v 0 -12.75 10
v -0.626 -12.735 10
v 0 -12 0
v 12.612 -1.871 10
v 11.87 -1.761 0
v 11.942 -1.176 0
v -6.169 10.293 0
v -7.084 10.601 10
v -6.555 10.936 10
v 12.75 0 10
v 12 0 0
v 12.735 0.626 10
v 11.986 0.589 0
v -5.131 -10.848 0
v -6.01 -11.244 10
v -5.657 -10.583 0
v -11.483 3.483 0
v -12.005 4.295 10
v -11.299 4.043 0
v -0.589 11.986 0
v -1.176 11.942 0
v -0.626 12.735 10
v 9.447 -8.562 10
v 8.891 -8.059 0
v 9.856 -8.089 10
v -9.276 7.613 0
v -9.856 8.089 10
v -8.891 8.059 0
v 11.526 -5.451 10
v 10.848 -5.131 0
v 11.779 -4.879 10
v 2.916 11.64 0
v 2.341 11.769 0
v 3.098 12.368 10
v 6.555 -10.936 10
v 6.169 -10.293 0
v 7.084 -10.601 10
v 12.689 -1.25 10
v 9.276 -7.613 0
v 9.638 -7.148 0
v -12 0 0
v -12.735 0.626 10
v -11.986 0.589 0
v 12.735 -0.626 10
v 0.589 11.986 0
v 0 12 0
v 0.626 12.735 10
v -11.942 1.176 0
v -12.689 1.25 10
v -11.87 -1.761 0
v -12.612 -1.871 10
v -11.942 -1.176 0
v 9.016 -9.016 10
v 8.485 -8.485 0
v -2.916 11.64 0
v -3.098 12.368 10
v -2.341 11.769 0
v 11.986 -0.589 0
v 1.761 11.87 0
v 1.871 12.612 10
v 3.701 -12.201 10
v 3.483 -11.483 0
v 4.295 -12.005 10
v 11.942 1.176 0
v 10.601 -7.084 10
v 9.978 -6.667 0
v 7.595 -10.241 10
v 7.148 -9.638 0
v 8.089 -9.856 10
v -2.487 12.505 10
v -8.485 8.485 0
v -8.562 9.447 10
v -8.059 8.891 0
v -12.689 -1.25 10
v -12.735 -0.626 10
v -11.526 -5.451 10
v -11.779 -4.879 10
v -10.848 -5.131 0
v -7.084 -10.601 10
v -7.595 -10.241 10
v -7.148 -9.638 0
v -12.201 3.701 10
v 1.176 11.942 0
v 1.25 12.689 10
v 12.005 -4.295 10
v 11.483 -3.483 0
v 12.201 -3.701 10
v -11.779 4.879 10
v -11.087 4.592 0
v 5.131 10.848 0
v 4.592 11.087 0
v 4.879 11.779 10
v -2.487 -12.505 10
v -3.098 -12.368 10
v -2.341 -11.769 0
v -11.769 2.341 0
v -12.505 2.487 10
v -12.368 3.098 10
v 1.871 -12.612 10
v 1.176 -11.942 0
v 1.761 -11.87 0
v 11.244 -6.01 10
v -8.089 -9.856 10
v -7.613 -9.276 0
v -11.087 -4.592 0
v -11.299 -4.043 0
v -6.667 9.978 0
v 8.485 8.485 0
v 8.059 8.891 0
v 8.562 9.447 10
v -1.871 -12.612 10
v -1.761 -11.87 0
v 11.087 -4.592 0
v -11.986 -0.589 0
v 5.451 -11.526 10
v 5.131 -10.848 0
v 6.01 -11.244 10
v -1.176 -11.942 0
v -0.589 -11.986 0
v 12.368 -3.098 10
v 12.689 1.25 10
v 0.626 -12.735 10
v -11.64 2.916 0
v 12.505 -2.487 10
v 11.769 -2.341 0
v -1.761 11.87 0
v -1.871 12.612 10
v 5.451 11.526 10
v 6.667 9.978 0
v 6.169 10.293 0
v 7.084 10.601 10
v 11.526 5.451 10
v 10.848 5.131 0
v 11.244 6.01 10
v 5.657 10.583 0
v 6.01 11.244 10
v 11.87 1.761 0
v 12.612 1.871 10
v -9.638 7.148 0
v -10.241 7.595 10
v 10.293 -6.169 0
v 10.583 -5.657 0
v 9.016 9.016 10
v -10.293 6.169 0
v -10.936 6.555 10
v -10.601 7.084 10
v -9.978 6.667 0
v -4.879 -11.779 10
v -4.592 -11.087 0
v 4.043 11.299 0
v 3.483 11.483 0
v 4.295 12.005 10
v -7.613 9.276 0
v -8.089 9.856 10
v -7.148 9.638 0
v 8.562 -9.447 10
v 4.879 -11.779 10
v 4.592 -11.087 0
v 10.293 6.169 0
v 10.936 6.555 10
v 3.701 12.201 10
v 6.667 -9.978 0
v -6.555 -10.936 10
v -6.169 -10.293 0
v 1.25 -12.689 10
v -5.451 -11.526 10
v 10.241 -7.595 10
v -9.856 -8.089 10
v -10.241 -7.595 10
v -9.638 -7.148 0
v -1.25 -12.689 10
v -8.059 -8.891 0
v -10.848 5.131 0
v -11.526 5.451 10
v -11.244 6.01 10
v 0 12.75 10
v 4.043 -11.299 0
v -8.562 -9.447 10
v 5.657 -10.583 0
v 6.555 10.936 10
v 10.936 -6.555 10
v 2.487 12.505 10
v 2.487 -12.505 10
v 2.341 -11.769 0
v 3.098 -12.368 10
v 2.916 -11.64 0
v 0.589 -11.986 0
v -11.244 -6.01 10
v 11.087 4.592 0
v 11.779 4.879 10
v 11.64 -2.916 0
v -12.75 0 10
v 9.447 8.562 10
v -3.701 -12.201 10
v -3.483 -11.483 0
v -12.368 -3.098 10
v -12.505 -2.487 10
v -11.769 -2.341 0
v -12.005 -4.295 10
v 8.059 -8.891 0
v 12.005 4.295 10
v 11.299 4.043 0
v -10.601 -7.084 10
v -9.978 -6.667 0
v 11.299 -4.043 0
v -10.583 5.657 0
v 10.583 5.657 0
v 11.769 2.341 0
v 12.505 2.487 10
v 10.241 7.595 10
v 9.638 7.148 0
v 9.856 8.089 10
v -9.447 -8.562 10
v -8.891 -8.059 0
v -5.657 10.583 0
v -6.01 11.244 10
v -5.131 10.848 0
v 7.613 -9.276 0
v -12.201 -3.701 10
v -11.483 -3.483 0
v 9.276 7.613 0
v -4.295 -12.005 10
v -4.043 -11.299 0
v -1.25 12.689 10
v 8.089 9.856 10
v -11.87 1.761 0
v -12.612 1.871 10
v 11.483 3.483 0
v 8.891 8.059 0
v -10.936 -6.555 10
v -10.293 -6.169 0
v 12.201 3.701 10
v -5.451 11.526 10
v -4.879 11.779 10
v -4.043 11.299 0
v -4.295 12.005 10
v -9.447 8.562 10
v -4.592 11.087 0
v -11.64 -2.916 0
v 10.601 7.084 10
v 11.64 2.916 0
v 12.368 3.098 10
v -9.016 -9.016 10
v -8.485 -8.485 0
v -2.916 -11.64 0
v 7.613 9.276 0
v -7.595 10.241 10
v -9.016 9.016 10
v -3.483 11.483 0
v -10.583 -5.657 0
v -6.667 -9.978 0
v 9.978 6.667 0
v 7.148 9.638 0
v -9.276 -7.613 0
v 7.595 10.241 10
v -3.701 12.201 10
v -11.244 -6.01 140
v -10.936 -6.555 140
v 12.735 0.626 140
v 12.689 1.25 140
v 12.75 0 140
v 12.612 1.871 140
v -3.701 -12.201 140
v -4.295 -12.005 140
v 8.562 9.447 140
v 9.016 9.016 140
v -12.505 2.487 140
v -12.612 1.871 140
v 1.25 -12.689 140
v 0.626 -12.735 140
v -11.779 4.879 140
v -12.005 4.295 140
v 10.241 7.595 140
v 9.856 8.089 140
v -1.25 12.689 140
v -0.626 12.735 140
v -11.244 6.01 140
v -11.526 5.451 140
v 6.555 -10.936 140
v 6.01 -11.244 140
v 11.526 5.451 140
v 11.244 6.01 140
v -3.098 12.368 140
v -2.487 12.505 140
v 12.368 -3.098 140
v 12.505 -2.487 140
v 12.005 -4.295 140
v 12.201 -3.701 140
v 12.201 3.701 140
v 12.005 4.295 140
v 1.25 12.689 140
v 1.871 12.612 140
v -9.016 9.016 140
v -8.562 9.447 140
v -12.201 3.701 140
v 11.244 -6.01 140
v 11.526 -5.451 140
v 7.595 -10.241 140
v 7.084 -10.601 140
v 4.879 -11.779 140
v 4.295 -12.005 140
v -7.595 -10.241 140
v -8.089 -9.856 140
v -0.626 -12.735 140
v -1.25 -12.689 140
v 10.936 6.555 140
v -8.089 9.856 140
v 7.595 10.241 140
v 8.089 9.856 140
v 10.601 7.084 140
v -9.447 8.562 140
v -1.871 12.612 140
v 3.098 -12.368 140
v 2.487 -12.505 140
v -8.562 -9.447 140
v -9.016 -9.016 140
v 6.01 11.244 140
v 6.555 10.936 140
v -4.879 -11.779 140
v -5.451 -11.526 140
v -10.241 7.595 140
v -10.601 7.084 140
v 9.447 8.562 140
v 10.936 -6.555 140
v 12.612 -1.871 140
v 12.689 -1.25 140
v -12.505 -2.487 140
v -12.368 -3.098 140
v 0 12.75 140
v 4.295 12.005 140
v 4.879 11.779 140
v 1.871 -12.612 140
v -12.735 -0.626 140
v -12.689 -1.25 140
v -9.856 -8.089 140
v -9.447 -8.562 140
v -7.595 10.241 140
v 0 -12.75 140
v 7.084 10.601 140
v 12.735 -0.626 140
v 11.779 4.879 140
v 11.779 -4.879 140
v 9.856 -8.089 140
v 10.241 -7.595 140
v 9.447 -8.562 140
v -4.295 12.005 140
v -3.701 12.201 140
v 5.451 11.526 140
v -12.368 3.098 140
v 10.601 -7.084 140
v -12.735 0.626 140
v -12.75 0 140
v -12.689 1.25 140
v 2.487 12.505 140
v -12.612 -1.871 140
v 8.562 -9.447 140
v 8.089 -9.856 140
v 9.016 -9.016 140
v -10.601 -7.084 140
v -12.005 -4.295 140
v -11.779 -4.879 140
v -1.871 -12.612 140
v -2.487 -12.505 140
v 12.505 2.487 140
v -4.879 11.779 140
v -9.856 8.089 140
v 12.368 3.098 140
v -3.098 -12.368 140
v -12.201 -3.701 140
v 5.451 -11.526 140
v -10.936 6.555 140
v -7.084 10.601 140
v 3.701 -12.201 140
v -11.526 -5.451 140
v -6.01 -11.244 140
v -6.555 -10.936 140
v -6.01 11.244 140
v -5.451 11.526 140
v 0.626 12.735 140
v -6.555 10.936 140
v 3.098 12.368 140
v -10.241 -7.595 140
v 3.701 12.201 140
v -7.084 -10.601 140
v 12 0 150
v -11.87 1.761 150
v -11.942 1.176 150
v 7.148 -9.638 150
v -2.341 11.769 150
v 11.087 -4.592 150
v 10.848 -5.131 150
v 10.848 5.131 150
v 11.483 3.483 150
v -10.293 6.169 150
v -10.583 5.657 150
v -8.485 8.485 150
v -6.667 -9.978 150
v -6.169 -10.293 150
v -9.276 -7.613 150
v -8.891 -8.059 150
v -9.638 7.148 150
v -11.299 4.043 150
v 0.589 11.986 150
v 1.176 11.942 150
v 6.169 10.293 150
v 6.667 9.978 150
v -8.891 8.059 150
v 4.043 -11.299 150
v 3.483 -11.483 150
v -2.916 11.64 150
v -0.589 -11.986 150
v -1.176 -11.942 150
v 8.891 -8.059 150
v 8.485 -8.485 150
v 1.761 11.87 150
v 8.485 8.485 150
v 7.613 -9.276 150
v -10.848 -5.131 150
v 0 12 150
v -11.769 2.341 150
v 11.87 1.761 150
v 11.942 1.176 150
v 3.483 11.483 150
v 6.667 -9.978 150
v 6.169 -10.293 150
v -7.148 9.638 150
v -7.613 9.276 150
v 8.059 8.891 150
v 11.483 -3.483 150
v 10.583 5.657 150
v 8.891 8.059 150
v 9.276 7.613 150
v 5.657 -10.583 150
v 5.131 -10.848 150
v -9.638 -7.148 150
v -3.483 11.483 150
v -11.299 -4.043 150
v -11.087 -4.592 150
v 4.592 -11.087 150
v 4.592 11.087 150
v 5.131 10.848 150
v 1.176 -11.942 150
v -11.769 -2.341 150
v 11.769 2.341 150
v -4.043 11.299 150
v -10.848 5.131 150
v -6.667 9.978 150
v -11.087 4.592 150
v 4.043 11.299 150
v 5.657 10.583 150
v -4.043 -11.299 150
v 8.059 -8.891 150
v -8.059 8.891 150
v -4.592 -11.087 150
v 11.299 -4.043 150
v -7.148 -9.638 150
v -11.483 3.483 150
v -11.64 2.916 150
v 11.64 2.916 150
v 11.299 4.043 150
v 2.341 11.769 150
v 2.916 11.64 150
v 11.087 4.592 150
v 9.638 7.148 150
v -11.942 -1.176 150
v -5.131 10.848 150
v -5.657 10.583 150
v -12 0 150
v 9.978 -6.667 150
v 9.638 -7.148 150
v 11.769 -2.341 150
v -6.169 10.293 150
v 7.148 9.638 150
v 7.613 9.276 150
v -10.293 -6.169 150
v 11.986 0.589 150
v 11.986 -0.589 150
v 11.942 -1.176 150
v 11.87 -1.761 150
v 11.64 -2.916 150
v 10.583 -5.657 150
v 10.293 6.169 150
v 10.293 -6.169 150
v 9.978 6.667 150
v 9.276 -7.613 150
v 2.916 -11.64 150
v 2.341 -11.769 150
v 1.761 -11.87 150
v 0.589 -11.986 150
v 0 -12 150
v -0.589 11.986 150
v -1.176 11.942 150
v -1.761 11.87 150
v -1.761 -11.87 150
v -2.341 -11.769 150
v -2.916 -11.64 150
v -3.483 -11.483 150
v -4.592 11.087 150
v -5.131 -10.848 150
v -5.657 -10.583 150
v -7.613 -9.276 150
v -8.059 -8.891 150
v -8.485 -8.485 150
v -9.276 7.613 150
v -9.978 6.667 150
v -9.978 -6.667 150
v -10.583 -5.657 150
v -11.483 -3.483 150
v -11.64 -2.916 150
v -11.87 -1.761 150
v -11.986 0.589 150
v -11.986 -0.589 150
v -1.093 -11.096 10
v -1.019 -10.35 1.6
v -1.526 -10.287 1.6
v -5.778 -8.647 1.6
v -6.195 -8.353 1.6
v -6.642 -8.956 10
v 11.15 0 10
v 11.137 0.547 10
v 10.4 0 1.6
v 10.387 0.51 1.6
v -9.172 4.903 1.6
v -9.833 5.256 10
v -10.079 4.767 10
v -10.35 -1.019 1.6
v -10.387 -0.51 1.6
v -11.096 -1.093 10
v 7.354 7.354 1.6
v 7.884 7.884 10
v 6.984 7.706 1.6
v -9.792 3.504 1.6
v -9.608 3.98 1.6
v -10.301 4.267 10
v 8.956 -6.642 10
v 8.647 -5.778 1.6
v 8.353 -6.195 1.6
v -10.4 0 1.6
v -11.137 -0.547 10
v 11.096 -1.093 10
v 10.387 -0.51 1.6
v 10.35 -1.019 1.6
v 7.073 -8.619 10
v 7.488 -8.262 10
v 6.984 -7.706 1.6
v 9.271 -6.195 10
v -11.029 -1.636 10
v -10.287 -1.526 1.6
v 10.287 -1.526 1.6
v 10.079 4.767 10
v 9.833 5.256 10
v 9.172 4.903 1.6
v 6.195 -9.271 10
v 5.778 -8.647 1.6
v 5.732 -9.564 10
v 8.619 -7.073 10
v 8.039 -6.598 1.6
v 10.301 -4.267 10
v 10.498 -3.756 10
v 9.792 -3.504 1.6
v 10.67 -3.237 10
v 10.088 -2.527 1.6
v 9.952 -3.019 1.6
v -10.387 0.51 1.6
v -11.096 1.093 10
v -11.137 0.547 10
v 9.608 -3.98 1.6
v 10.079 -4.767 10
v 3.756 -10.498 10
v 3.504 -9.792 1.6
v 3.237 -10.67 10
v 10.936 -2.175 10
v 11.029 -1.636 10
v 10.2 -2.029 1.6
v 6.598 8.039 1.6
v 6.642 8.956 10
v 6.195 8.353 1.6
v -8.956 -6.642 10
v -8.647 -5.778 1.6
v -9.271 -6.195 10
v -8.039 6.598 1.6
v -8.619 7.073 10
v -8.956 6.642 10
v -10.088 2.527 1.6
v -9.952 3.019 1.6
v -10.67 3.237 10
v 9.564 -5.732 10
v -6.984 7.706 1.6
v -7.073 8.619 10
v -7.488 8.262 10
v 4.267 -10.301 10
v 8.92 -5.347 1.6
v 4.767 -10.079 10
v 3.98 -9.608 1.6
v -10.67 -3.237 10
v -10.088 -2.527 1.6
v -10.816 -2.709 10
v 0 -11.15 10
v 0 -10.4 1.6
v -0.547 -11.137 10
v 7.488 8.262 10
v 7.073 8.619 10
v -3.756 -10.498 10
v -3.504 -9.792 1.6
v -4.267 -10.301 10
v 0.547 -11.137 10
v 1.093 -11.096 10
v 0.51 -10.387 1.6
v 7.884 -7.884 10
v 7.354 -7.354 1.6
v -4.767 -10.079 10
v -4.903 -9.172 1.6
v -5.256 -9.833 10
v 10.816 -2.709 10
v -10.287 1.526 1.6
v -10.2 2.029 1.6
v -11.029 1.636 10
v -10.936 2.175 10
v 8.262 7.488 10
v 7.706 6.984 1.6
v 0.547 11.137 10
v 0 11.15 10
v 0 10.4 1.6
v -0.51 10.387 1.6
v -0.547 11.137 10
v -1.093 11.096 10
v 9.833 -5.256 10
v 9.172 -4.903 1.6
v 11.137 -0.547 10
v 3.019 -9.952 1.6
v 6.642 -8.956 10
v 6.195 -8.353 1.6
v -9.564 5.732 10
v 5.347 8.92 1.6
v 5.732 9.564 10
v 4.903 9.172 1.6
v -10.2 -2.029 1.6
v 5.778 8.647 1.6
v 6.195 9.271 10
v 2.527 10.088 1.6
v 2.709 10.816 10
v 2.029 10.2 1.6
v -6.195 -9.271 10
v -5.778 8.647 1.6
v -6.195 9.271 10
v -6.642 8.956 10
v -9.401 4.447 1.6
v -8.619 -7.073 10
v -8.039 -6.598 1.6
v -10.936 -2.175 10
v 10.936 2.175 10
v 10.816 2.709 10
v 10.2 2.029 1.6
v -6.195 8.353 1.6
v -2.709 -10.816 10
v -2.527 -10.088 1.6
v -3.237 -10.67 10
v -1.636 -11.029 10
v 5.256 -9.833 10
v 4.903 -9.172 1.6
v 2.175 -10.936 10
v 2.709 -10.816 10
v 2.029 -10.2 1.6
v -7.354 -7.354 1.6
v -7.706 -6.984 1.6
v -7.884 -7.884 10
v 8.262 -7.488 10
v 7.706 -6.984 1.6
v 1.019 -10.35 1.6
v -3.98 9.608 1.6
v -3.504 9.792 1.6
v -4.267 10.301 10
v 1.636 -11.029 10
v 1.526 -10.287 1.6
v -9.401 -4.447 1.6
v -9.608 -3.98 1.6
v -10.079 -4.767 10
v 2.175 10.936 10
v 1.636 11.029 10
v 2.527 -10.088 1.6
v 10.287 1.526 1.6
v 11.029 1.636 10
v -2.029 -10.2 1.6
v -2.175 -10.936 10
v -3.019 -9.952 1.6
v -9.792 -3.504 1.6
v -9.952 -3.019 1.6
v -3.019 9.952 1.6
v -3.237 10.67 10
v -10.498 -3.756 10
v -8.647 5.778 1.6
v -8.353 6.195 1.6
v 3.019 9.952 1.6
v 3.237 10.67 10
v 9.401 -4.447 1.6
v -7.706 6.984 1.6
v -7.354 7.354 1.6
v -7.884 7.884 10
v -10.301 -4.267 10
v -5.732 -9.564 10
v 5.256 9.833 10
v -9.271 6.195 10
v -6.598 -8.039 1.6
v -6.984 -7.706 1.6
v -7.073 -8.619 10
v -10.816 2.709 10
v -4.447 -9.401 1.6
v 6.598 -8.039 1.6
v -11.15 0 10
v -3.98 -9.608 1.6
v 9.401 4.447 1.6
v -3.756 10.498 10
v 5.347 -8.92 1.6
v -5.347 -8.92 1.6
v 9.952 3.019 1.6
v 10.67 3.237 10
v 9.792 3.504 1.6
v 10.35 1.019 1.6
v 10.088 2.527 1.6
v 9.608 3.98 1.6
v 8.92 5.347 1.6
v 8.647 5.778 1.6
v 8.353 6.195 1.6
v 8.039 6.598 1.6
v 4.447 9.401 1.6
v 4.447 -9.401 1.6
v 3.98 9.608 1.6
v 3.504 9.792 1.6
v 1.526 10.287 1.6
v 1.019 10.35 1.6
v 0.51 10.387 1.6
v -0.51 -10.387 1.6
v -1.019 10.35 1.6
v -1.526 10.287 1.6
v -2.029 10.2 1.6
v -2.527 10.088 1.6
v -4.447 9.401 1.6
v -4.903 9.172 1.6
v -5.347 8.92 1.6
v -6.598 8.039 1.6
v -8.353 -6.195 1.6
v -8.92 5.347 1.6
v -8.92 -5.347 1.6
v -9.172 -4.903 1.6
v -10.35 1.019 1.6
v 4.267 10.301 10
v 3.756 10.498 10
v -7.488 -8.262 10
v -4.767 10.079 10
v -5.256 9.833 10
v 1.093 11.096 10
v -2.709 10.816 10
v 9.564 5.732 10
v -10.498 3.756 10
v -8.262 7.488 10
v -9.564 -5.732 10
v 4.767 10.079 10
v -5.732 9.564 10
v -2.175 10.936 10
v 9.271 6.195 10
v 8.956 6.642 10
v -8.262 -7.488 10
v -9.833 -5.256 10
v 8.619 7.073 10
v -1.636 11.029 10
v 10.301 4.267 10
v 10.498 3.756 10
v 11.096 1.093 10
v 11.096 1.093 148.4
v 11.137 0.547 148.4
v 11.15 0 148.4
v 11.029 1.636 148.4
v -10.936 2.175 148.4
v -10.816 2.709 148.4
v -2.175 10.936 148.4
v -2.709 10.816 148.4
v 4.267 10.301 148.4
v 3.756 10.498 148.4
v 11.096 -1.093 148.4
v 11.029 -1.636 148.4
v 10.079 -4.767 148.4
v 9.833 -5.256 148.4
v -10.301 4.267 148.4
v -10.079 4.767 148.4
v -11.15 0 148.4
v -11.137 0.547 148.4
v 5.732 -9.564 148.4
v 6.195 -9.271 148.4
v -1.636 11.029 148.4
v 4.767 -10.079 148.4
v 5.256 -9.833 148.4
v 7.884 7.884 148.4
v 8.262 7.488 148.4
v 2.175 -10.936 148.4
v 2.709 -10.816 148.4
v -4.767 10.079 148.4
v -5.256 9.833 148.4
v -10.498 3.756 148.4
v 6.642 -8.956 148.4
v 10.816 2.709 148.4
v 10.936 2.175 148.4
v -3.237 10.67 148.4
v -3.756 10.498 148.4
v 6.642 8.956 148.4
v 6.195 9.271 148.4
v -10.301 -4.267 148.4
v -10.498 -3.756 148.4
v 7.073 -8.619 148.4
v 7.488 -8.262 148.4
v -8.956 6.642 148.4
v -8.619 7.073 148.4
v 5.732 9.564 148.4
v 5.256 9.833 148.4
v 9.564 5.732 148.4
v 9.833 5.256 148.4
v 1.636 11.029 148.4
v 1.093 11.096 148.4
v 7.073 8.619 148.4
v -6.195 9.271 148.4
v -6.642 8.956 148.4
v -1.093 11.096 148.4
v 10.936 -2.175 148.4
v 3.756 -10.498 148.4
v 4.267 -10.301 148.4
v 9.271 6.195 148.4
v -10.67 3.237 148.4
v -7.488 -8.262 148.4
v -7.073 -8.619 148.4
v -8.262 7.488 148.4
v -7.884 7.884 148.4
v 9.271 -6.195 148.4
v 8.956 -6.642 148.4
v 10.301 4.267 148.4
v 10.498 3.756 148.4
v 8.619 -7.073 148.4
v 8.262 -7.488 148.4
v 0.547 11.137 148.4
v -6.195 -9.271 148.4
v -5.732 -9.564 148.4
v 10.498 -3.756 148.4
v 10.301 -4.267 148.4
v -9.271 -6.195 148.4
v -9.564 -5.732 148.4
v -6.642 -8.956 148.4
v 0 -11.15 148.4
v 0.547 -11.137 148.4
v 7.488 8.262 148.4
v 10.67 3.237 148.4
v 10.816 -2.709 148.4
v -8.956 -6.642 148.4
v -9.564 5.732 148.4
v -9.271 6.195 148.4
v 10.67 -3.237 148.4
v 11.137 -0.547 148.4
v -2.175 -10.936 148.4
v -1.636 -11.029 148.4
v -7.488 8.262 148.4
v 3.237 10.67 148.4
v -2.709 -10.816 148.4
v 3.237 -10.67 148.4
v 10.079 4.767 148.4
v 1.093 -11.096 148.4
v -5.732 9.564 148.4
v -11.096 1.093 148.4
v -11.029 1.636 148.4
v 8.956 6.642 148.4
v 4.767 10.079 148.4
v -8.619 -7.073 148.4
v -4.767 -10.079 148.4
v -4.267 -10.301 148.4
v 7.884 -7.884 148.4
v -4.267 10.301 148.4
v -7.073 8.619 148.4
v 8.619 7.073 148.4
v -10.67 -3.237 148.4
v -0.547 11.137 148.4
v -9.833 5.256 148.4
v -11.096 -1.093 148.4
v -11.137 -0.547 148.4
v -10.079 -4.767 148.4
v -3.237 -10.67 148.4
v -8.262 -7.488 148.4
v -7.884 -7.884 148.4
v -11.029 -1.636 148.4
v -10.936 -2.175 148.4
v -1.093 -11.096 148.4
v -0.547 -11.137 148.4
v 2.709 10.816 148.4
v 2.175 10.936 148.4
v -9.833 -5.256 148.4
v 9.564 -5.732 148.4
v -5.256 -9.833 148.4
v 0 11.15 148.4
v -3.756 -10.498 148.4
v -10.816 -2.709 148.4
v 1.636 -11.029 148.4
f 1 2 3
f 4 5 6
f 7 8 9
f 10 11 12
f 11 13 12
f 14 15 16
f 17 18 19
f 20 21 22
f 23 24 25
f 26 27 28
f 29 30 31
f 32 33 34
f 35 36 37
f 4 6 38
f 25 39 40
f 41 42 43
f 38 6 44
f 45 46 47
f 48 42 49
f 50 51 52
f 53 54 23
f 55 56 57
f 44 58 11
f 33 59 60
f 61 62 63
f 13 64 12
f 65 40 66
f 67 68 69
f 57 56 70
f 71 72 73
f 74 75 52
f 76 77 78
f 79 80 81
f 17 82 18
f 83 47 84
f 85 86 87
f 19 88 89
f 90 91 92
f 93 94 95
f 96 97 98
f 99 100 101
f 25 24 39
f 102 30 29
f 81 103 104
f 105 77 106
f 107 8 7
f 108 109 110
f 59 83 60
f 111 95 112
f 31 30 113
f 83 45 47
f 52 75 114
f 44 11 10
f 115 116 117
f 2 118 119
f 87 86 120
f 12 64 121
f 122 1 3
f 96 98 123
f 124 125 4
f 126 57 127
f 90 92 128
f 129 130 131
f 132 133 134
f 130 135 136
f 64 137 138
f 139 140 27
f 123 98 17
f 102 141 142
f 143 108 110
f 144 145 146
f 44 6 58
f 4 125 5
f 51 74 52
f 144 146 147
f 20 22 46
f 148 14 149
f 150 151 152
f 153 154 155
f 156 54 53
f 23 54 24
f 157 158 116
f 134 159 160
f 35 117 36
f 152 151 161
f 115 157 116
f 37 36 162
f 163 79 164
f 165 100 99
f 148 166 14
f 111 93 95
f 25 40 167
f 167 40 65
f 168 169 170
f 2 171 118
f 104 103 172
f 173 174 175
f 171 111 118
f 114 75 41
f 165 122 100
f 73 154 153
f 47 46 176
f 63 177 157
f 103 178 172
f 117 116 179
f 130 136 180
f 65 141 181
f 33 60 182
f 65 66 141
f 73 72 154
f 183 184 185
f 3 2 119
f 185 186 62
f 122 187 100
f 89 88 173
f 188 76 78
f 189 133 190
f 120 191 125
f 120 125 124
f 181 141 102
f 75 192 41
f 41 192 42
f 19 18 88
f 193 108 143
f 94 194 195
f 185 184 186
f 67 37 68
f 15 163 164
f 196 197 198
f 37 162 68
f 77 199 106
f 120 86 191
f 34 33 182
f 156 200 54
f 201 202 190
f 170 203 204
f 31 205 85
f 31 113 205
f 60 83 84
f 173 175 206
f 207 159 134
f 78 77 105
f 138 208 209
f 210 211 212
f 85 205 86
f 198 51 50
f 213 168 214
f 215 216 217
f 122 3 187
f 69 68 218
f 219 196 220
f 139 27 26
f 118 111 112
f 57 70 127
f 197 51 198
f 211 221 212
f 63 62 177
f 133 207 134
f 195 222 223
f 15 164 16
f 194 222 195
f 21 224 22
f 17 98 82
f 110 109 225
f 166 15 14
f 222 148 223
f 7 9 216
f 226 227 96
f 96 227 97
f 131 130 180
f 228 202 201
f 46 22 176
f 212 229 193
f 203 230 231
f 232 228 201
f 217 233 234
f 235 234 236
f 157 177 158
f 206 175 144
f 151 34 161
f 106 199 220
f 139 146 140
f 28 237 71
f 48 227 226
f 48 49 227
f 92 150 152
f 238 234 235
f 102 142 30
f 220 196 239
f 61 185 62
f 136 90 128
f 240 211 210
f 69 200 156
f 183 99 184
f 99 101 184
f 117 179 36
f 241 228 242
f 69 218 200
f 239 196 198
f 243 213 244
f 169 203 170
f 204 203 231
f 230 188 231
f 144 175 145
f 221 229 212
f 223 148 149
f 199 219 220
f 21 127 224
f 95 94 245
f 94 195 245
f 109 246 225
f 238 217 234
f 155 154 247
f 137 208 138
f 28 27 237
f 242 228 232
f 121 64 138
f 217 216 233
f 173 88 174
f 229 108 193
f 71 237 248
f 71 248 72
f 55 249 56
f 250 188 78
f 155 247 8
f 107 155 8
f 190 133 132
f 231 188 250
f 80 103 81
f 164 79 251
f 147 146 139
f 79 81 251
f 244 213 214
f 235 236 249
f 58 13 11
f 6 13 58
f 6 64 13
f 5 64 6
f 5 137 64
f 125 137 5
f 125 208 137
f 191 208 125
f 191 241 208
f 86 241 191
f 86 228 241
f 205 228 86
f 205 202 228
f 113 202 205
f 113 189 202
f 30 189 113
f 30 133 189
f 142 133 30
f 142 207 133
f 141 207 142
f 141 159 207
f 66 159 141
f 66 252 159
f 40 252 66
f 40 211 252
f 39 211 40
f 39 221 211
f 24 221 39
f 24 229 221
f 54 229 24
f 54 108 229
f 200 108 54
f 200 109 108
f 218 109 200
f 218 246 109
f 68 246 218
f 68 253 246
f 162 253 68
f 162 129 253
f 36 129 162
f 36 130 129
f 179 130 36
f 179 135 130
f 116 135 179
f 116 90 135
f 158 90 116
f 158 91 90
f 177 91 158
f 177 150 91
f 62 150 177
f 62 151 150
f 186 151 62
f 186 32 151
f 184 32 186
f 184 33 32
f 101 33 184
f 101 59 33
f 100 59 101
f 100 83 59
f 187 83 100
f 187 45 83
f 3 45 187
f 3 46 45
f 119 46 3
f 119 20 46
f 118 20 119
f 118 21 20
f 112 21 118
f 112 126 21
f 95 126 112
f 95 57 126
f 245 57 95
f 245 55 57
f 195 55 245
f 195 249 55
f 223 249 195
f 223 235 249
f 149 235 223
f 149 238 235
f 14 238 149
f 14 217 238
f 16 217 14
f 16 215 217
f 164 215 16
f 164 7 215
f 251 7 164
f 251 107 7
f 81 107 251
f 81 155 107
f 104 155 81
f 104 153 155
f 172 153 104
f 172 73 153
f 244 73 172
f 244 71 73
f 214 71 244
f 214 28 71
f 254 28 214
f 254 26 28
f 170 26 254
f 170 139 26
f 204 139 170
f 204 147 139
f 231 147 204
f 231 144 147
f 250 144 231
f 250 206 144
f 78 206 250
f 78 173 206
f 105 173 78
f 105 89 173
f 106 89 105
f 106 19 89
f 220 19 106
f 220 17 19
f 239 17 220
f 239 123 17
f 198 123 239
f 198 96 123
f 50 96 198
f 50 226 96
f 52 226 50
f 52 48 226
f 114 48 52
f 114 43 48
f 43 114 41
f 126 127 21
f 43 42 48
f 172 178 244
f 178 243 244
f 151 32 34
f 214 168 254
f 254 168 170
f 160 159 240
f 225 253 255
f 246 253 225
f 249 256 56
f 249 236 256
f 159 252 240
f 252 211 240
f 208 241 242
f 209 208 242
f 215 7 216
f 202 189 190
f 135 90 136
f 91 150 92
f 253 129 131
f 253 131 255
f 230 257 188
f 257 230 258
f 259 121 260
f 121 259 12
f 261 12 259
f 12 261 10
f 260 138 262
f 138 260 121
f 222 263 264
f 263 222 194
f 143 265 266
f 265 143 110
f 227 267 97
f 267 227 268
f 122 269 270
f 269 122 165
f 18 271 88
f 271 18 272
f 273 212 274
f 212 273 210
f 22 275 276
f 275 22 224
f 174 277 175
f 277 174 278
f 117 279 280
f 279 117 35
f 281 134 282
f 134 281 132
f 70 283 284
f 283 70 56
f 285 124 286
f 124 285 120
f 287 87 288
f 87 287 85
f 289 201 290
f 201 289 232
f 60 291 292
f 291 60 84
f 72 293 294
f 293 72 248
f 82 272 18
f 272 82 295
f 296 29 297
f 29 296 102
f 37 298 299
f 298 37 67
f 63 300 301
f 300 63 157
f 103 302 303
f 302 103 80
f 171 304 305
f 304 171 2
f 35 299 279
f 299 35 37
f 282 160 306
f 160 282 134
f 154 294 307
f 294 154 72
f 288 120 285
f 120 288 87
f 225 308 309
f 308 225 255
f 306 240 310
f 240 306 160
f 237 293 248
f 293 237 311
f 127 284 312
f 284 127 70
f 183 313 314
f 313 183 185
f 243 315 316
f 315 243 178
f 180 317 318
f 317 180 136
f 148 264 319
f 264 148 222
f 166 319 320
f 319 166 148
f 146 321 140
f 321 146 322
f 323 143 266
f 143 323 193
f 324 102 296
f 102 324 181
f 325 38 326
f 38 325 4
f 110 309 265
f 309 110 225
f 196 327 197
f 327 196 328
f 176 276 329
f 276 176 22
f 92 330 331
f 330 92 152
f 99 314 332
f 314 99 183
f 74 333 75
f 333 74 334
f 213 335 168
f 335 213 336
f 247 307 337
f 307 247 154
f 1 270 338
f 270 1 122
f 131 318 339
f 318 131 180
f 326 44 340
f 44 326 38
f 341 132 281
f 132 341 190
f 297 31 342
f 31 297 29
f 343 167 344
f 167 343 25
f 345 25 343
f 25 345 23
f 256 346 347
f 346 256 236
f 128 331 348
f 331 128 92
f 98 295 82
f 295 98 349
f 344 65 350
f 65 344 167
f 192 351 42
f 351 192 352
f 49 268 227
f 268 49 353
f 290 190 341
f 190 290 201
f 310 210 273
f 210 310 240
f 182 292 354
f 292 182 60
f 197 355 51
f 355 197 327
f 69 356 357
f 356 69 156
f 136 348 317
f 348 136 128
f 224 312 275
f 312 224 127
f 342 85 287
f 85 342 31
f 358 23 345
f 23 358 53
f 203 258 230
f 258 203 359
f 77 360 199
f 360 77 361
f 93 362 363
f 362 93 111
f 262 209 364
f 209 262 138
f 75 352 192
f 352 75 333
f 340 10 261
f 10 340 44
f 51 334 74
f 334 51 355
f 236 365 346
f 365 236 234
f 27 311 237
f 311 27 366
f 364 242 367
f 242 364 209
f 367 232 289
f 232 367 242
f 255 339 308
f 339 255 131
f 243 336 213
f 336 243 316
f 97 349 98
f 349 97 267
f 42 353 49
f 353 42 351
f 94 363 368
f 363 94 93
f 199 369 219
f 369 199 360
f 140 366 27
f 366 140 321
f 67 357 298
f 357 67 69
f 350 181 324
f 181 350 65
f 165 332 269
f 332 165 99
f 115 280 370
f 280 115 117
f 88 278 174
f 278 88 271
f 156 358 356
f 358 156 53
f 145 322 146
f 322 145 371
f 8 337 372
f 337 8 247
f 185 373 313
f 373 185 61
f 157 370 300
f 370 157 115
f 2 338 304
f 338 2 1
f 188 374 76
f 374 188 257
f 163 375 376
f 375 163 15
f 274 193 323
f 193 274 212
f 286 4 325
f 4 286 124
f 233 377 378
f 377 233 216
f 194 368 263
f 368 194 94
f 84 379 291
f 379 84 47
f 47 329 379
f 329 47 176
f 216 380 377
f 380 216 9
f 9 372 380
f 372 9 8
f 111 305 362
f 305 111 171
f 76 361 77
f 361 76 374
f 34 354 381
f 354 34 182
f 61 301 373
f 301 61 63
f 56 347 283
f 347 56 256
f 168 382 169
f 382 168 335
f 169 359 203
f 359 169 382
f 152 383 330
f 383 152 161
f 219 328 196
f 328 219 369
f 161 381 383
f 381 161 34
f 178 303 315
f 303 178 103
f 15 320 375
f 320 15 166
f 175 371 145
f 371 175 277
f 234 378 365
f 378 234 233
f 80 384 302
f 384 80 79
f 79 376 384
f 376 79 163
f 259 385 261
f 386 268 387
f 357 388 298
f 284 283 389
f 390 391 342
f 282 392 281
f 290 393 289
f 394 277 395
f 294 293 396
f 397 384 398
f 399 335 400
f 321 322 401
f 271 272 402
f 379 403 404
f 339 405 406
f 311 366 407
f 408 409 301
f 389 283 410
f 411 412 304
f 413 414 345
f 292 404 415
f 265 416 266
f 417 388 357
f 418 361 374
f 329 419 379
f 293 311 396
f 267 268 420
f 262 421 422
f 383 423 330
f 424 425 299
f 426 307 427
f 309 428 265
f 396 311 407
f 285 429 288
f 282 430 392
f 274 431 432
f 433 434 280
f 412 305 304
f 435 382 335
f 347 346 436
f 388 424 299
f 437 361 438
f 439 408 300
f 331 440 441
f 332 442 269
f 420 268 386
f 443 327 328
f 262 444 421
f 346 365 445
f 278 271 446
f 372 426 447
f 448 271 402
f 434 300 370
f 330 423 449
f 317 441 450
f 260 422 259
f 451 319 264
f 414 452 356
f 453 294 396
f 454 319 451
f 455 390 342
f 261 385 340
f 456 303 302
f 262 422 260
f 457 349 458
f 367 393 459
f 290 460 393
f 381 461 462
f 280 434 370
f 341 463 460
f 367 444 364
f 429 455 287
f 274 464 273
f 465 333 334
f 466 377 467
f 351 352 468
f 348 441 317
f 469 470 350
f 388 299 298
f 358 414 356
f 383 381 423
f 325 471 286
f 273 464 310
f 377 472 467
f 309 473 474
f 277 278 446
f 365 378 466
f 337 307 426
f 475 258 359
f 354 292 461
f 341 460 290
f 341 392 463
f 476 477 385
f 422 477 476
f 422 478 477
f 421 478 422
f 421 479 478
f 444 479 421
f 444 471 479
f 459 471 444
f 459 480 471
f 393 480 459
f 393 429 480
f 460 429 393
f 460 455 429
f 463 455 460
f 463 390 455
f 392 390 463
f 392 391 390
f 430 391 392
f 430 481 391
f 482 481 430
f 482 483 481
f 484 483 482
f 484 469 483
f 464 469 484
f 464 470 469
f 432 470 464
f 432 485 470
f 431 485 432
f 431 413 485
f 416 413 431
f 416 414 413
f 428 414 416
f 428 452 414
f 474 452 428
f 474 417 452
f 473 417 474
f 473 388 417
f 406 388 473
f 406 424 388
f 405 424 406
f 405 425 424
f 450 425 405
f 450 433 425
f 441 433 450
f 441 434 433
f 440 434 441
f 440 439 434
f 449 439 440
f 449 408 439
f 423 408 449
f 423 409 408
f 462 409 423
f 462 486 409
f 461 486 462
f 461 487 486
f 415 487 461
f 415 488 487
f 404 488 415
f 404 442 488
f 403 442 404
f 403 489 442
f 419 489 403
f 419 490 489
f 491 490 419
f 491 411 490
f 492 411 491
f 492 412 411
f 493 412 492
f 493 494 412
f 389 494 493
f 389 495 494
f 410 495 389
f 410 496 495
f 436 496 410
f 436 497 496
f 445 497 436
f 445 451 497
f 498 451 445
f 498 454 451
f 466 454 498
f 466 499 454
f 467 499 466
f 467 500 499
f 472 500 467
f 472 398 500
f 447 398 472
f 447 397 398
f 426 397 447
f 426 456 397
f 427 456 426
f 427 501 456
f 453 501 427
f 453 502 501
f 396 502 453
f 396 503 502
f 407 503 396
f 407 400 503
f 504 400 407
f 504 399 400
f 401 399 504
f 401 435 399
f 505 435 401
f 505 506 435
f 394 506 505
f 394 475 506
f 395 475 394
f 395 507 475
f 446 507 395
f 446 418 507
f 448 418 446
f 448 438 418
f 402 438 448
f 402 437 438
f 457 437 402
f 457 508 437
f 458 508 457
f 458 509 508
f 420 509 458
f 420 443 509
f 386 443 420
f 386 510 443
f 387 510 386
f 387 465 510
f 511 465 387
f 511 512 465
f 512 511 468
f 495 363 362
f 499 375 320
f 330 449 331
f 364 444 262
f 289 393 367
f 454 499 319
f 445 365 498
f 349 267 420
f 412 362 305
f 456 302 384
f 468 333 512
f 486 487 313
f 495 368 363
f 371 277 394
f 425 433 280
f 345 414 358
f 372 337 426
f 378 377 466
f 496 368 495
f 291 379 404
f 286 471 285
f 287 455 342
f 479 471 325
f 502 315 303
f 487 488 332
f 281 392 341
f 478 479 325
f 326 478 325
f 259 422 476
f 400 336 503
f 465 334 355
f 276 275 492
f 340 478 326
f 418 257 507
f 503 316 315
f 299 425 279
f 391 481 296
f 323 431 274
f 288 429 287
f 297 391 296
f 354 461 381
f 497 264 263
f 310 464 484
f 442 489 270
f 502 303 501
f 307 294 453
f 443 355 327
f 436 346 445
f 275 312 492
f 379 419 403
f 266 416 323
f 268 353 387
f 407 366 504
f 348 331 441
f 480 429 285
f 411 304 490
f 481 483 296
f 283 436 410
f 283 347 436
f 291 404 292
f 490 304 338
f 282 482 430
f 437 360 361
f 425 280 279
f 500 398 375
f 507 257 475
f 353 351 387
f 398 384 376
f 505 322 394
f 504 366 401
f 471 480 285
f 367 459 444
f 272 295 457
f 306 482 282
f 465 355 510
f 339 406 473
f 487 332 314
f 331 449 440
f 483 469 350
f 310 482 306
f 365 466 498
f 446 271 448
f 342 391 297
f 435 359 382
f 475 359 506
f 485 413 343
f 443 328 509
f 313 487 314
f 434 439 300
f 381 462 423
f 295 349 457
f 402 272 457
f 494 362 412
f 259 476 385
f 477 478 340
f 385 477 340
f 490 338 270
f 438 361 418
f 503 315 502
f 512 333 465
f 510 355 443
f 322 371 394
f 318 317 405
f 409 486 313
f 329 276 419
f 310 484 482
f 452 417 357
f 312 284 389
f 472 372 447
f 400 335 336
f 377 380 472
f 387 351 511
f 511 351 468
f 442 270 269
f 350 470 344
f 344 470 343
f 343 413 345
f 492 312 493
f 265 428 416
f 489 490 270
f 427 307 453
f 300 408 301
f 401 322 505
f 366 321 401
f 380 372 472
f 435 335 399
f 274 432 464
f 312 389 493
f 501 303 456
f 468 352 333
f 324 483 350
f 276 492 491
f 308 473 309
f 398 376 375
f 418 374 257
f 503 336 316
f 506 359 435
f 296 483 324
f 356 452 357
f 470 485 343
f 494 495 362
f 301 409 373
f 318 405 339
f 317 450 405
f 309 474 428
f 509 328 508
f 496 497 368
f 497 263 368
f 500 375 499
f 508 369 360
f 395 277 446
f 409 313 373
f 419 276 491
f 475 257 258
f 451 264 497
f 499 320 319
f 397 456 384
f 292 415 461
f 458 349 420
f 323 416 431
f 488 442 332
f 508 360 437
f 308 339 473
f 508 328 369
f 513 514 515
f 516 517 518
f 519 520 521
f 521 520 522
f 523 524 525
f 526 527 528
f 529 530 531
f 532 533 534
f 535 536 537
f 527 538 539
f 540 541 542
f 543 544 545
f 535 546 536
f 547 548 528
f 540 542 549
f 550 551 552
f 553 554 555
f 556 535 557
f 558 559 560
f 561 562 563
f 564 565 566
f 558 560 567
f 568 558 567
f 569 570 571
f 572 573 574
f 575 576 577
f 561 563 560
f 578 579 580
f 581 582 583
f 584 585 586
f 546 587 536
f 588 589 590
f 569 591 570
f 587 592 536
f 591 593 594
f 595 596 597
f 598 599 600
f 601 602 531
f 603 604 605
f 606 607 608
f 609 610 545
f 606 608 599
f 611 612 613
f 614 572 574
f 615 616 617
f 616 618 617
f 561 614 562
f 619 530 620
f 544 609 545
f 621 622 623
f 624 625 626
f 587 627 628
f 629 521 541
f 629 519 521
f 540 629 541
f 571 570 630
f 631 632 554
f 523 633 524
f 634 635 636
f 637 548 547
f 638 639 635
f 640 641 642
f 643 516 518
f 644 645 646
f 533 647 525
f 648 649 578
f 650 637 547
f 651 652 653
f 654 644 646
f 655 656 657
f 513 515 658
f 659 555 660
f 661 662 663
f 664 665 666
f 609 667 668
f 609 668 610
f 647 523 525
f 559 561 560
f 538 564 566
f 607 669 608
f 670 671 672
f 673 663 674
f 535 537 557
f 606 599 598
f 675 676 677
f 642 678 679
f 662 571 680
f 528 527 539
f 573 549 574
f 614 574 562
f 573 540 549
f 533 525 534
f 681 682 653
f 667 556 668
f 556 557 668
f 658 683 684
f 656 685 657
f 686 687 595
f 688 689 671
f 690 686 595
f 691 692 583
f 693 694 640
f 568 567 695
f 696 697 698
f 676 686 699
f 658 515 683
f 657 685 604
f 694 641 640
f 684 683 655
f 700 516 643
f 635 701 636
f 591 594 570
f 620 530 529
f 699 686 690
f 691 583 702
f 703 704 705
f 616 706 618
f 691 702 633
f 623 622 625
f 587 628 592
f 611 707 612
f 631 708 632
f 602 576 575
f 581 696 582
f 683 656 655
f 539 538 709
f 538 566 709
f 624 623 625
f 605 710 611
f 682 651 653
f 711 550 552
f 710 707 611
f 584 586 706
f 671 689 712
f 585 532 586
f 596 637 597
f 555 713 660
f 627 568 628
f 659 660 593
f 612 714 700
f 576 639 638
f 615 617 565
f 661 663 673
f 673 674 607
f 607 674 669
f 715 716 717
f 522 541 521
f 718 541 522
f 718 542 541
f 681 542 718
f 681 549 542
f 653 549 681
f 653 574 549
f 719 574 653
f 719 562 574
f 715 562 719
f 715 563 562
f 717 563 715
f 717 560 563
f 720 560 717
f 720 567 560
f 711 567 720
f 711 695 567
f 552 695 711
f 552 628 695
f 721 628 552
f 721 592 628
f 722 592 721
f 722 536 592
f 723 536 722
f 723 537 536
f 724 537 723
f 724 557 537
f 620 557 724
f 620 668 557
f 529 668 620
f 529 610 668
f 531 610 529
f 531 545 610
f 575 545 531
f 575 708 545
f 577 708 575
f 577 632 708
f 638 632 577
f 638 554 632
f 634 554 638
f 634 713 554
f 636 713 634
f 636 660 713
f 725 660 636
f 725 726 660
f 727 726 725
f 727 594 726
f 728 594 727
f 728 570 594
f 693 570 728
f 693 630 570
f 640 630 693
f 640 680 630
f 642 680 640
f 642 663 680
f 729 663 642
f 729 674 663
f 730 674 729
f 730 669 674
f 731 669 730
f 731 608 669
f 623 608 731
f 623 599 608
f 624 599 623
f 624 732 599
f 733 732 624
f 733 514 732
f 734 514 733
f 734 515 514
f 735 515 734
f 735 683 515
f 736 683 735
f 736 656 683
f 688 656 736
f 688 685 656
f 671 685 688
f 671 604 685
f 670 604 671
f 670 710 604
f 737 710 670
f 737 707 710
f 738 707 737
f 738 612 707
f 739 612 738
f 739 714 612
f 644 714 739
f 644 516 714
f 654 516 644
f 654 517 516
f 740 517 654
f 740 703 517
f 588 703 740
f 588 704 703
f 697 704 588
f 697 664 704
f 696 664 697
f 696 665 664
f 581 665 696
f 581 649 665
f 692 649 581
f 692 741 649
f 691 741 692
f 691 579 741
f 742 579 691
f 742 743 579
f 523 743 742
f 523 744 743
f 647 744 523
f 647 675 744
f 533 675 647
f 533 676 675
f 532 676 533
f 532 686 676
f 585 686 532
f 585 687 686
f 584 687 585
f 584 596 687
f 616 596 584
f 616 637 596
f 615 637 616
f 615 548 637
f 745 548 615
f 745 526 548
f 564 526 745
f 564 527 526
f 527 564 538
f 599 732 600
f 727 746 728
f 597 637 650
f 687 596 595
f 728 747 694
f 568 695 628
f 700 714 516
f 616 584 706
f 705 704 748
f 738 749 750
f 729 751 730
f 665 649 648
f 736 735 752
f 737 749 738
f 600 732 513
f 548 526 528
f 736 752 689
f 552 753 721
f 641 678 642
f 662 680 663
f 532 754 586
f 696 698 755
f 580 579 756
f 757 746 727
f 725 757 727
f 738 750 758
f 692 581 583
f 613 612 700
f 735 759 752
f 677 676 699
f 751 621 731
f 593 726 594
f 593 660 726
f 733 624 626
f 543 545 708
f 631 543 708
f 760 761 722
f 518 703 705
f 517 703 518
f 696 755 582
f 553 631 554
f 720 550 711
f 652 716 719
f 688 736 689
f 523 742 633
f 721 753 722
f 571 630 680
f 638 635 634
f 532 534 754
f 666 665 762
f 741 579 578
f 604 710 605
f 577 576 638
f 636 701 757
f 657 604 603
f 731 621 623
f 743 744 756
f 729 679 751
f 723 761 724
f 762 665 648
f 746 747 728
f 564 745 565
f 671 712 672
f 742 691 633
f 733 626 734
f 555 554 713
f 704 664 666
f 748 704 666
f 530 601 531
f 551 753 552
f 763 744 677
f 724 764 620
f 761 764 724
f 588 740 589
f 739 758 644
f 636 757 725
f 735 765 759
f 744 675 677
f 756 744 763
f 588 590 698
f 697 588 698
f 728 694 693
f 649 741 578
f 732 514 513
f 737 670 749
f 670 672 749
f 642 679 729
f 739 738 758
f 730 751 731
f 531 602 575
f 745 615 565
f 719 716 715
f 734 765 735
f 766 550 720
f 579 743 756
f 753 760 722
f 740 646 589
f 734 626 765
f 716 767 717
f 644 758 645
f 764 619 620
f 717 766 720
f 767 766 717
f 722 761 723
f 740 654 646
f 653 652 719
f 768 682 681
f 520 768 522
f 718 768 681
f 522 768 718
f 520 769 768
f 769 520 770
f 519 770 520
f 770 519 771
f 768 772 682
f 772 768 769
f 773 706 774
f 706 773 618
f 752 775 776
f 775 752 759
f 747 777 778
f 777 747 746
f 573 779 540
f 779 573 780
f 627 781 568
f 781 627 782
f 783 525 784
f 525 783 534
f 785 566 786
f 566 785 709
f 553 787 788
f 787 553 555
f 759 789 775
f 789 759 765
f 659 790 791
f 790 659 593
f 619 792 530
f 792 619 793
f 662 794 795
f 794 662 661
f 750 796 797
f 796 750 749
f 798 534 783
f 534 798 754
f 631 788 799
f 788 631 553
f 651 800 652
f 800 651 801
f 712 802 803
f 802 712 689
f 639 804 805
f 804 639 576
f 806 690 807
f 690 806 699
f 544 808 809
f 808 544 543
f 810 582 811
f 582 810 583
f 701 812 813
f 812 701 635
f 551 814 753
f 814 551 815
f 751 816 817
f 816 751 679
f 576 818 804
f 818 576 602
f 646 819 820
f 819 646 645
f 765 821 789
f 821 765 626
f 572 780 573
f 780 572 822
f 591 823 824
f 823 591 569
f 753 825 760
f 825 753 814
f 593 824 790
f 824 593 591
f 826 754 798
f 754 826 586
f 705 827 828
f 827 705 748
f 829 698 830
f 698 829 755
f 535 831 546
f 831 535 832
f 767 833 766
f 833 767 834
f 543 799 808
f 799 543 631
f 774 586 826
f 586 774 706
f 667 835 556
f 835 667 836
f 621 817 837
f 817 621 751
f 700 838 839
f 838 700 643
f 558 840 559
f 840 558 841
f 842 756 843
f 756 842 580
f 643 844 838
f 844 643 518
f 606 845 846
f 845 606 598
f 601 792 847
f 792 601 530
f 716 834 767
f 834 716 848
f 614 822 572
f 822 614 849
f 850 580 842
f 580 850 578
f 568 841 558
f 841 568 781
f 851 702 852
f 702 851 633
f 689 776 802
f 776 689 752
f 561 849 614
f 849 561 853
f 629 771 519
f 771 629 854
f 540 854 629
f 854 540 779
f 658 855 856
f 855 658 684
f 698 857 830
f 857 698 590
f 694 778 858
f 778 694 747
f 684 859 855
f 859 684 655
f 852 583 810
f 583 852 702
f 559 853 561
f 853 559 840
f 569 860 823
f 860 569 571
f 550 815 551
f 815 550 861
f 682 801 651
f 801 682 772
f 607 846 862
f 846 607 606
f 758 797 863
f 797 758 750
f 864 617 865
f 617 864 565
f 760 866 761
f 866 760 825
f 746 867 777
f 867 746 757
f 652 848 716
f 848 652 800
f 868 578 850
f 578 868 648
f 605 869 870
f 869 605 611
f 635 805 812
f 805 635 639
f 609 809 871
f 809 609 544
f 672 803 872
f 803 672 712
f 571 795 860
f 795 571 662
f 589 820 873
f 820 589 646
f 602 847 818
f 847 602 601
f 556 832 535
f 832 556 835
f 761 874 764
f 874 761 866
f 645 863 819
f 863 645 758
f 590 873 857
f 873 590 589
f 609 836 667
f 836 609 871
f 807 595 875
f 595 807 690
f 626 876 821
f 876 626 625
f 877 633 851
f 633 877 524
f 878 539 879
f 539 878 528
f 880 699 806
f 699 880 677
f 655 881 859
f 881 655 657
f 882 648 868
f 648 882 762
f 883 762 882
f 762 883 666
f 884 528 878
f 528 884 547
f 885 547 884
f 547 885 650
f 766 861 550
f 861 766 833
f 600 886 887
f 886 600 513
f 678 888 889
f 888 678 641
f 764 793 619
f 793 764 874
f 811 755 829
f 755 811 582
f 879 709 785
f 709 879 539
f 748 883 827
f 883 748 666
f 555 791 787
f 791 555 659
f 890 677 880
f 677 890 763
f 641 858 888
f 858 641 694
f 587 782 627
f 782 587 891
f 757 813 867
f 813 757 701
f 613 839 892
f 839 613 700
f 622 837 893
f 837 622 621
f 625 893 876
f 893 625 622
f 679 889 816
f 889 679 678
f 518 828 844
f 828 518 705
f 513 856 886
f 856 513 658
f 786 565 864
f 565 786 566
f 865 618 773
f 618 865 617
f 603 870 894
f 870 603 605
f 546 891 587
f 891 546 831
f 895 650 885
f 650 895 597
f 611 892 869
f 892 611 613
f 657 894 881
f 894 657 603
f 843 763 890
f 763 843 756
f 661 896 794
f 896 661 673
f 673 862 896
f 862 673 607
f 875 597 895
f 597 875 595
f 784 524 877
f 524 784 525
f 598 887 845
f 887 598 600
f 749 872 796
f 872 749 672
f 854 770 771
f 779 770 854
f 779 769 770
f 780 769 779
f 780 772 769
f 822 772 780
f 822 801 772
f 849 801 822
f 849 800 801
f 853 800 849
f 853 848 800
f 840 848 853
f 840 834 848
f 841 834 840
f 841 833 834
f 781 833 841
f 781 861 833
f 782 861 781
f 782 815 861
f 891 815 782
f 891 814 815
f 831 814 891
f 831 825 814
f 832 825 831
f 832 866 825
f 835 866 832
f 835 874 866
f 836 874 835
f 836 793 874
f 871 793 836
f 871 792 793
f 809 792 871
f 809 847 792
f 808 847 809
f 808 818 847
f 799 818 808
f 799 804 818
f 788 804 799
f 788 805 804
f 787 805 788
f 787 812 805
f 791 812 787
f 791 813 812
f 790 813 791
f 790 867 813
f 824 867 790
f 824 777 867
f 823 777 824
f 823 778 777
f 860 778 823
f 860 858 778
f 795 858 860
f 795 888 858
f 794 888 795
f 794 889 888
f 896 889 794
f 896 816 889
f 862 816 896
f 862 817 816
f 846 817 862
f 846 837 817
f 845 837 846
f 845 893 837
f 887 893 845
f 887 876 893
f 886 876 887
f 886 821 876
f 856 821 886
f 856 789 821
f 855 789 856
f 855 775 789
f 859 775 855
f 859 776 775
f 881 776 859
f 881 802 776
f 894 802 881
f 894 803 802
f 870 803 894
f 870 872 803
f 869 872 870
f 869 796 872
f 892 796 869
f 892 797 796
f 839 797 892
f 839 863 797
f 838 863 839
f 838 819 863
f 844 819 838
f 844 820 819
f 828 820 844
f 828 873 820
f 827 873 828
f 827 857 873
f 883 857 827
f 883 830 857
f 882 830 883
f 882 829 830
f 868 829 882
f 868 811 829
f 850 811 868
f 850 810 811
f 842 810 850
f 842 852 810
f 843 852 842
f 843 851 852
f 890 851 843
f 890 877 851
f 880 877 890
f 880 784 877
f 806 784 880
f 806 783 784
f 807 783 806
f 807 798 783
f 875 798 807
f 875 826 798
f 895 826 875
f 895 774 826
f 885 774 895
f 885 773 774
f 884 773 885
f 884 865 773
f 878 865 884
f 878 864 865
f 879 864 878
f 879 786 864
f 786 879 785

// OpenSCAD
// Total Length
l = 150;

// Maximum Diameter
diameter = 25.5;

// Taper (gets subtracted from Maximum Diameter to yield Diameter at Ends)
taper = 1.5;

// Length of Tapered Section (should be smaller than half the Total Length)
taper_length = 10;

// Wall Thickness
wall_thickness = 1.6;

// DOUBLE Wall Thickness
double_thickness = 2 * wall_thickness;

//Number of Facets
$fn = 128;

difference ()
{
    union ()
    {
        cylinder (d2 = diameter, d1 = diameter - taper, h = taper_length);
        
        translate ([0, 0, taper_length])
            cylinder (d = diameter, h = l - 2 * taper_length);
        
        translate ([0, 0, l - taper_length])
            cylinder (d1 = diameter, d2 = diameter - taper, h = taper_length);
    }
    
    union ()
    {
        translate ([0, 0, double_thickness/2])
            cylinder (d2 = diameter - double_thickness, d1 = diameter - taper - double_thickness, h = taper_length - double_thickness/2);
        
        translate ([0, 0, taper_length])
            cylinder (d = diameter - double_thickness, h = l - 2 * taper_length);
        
        translate ([0, 0, l - taper_length])
            cylinder (d1 = diameter - double_thickness, d2 = diameter - double_thickness, h = taper_length - double_thickness/2);
    }
}
